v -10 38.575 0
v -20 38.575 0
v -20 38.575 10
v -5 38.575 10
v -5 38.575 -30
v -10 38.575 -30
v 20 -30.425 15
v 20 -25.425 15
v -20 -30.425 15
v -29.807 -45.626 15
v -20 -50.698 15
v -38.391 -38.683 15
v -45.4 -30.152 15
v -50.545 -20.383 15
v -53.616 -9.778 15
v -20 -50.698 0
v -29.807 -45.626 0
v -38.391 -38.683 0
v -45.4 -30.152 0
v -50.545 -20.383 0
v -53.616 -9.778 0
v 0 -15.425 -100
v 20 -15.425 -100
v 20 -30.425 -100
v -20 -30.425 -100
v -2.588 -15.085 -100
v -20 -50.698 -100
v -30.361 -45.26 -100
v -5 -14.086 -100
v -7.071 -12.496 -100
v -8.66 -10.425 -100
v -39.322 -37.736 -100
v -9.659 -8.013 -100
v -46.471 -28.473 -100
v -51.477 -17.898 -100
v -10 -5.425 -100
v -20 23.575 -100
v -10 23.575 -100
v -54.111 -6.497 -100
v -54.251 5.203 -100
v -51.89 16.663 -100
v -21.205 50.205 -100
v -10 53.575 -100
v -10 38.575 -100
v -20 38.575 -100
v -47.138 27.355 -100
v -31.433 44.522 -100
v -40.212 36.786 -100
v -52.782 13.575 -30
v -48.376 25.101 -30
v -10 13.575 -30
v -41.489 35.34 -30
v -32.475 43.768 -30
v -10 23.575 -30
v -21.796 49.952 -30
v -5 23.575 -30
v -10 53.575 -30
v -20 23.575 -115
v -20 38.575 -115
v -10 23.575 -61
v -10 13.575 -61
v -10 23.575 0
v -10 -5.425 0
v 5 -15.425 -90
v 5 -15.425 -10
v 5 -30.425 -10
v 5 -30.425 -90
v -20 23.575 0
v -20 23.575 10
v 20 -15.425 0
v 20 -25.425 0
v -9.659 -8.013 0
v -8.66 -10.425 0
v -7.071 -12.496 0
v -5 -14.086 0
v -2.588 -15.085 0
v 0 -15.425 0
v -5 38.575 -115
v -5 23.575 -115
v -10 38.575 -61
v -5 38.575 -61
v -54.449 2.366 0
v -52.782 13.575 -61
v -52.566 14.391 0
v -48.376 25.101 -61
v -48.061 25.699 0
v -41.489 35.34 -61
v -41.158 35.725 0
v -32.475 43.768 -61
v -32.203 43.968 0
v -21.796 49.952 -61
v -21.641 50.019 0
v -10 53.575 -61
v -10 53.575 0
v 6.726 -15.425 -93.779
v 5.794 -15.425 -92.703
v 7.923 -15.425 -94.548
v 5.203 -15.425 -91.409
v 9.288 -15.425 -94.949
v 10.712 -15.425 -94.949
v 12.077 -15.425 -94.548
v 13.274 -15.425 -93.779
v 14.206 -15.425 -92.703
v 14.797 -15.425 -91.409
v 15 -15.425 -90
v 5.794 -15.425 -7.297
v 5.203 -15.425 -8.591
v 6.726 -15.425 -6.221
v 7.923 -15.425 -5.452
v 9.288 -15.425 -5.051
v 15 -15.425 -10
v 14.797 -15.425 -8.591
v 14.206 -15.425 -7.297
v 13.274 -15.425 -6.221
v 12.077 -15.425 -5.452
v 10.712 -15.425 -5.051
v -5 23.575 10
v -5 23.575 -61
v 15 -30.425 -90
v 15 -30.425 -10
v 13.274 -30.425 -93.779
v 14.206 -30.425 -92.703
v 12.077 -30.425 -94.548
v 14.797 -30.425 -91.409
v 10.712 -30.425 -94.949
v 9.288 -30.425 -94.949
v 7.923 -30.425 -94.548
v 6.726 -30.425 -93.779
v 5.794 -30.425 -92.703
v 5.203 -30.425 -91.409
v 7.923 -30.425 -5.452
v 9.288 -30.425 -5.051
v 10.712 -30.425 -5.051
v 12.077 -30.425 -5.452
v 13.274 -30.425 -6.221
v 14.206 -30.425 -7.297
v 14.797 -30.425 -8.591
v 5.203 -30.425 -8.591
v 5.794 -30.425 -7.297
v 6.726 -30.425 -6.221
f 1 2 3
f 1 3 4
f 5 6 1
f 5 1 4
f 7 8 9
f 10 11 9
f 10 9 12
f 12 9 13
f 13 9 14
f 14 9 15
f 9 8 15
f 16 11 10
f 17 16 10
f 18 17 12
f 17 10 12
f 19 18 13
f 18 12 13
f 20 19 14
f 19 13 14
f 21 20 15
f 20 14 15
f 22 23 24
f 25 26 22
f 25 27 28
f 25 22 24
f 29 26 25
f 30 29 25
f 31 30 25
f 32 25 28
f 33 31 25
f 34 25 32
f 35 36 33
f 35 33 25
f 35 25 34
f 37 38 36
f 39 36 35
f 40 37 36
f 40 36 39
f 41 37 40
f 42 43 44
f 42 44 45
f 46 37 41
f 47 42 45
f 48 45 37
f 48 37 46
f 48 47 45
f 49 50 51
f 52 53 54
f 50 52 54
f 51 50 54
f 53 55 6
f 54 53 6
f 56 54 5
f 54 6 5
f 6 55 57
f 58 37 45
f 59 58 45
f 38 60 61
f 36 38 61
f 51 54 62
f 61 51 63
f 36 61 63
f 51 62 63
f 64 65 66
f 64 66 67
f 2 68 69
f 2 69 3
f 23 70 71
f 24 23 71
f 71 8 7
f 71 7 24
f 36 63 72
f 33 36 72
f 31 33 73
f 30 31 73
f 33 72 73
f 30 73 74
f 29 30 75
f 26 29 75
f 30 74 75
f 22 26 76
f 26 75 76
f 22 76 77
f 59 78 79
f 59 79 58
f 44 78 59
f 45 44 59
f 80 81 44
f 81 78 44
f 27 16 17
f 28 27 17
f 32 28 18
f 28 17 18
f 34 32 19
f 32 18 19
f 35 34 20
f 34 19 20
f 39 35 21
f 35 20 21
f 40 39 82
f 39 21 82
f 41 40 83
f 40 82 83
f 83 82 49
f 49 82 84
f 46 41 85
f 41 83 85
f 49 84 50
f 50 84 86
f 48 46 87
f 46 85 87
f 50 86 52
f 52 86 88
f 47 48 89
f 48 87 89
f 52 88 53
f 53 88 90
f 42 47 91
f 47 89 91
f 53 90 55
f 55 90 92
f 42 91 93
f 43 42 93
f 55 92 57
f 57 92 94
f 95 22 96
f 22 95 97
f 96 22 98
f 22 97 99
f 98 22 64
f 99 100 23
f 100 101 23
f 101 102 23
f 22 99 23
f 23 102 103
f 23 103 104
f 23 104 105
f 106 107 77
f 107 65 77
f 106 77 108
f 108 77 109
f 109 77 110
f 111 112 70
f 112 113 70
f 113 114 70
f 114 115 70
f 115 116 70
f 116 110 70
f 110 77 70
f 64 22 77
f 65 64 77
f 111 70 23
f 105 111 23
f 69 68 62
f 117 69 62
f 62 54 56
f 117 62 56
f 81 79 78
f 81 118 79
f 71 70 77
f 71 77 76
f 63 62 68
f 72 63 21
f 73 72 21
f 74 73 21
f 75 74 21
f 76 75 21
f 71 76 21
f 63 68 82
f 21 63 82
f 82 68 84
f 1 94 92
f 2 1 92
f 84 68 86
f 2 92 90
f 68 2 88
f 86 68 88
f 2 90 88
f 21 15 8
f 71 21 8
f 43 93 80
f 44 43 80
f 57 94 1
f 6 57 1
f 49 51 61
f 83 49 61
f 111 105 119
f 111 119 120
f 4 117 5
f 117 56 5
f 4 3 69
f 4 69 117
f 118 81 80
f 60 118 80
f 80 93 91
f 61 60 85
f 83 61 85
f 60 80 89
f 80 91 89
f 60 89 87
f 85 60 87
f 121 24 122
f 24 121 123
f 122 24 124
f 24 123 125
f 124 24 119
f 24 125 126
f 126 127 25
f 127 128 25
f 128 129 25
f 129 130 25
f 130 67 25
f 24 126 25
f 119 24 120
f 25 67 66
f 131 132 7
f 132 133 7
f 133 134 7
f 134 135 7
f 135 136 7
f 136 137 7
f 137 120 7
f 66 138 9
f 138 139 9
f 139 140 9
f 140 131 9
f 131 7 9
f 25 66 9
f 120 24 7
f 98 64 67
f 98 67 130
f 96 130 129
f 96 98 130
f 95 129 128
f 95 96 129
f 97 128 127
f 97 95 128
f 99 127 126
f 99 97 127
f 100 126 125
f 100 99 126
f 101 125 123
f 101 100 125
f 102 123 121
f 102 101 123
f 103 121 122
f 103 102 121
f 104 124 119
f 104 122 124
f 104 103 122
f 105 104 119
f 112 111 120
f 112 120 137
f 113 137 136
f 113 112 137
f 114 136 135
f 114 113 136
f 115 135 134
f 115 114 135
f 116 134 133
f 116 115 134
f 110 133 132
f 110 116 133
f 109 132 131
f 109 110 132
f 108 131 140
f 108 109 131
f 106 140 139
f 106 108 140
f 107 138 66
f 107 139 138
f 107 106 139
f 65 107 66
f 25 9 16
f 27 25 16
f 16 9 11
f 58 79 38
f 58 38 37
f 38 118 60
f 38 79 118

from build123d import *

# Parameters (mm, degrees)
BOSS_EXTRUDE1_DEPTH = 100
BOSS_EXTRUDE2_START = 15
BOSS_EXTRUDE2_DEPTH = 15
SKETCH3_W           = 15
SKETCH3_H           = 15
BOSS_EXTRUDE3_DEPTH = 30
SKETCH4_W           = 15
SKETCH4_H           = 15
BOSS_EXTRUDE4_DEPTH = 10
SKETCH7_W           = 31
SKETCH7_H           = 40
CUT_EXTRUDE2_DEPTH  = 122.862627577
SKETCH8_W           = 15
SKETCH8_H           = 15
BOSS_EXTRUDE5_DEPTH = 39
SKETCH9_W           = 15
SKETCH9_H           = 15
BOSS_EXTRUDE6_DEPTH = 15
CUT_EXTRUDE4_DEPTH  = 145.762736918


with BuildPart() as part:
    # Sketch1 → Boss-Extrude1 (new body)
    with BuildSketch(Plane.XY):
        with BuildLine():
            Line((-10, 53.574714185), (-10, -5.425285815))
            ThreePointArc((-10, -5.425285815), (-7.071067812, -12.496353627), (0, -15.425285815))
            Line((0, -15.425285815), (20, -15.425285815))
            Line((20, -15.425285815), (20, -30.425285815))
            Line((20, -30.425285815), (-20, -30.425285815))
            Line((-20, -30.425285815), (-20, -50.697633081))
            ThreePointArc((-20, -50.697633081), (-54.251088478, 5.202826051), (-10, 53.574714185))
        make_face()
    extrude(amount=-BOSS_EXTRUDE1_DEPTH)

    # Sketch2 → Boss-Extrude2 (add)
    with BuildSketch(Plane.XY.offset(BOSS_EXTRUDE2_START)):
        with BuildLine():
            Line((20, -25.425285815), (20, -30.425285815))
            Line((20, -30.425285815), (-20, -30.425285815))
            Line((-20, -30.425285815), (-20, -50.697633081))
            ThreePointArc((-20, -50.697633081), (-42.112075999, -34.595130511), (-53.615715713, -9.777782398))
            Line((-53.615715713, -9.777782398), (20, -25.425285815))
        make_face()
    extrude(amount=-BOSS_EXTRUDE2_DEPTH)

    # Sketch3 → Boss-Extrude3 (add)
    with BuildSketch(Plane.XY):
        with Locations((-12.5, 31.074714185)):
            Rectangle(SKETCH3_W, SKETCH3_H)
    extrude(amount=-BOSS_EXTRUDE3_DEPTH)

    # Sketch4 → Boss-Extrude4 (add)
    with BuildSketch(Plane.XY):
        with Locations((-12.5, 31.074714185)):
            Rectangle(SKETCH4_W, SKETCH4_H)
    extrude(amount=BOSS_EXTRUDE4_DEPTH)

    # Sketch7 → Cut-Extrude2 (cut, through all)
    with BuildSketch(Plane(origin=(-10, 0, 0), x_dir=(0, 0, -1), z_dir=(1, 0, 0))):
        with Locations((45.5, 33.574714185)):
            Rectangle(SKETCH7_W, SKETCH7_H)
    extrude(amount=-CUT_EXTRUDE2_DEPTH, mode=Mode.SUBTRACT)

    # Sketch8 → Boss-Extrude5 (add)
    with BuildSketch(Plane(origin=(0, 0, -100), x_dir=(-1, 0, 0), z_dir=(0, 0, -1))):
        with Locations((12.5, 31.074714185)):
            Rectangle(SKETCH8_W, SKETCH8_H)
    extrude(amount=-BOSS_EXTRUDE5_DEPTH)

    # Sketch9 → Boss-Extrude6 (add)
    with BuildSketch(Plane(origin=(0, 0, -100), x_dir=(-1, 0, 0), z_dir=(0, 0, -1))):
        with Locations((12.5, 31.074714185)):
            Rectangle(SKETCH9_W, SKETCH9_H)
    extrude(amount=BOSS_EXTRUDE6_DEPTH)

    # Sketch10 → Cut-Extrude4 (cut, through all)
    with BuildSketch(Plane(origin=(0, -15.425285815, 0), x_dir=(1, 0, 0), z_dir=(0, 1, 0))):
        with BuildLine():
            Line((5, 10), (5, 90))
            ThreePointArc((5, 90), (10, 95), (15, 90))
            Line((15, 90), (15, 10))
            ThreePointArc((15, 10), (10, 5), (5, 10))
        make_face()
    extrude(amount=-CUT_EXTRUDE4_DEPTH, mode=Mode.SUBTRACT)


solid = part.part
